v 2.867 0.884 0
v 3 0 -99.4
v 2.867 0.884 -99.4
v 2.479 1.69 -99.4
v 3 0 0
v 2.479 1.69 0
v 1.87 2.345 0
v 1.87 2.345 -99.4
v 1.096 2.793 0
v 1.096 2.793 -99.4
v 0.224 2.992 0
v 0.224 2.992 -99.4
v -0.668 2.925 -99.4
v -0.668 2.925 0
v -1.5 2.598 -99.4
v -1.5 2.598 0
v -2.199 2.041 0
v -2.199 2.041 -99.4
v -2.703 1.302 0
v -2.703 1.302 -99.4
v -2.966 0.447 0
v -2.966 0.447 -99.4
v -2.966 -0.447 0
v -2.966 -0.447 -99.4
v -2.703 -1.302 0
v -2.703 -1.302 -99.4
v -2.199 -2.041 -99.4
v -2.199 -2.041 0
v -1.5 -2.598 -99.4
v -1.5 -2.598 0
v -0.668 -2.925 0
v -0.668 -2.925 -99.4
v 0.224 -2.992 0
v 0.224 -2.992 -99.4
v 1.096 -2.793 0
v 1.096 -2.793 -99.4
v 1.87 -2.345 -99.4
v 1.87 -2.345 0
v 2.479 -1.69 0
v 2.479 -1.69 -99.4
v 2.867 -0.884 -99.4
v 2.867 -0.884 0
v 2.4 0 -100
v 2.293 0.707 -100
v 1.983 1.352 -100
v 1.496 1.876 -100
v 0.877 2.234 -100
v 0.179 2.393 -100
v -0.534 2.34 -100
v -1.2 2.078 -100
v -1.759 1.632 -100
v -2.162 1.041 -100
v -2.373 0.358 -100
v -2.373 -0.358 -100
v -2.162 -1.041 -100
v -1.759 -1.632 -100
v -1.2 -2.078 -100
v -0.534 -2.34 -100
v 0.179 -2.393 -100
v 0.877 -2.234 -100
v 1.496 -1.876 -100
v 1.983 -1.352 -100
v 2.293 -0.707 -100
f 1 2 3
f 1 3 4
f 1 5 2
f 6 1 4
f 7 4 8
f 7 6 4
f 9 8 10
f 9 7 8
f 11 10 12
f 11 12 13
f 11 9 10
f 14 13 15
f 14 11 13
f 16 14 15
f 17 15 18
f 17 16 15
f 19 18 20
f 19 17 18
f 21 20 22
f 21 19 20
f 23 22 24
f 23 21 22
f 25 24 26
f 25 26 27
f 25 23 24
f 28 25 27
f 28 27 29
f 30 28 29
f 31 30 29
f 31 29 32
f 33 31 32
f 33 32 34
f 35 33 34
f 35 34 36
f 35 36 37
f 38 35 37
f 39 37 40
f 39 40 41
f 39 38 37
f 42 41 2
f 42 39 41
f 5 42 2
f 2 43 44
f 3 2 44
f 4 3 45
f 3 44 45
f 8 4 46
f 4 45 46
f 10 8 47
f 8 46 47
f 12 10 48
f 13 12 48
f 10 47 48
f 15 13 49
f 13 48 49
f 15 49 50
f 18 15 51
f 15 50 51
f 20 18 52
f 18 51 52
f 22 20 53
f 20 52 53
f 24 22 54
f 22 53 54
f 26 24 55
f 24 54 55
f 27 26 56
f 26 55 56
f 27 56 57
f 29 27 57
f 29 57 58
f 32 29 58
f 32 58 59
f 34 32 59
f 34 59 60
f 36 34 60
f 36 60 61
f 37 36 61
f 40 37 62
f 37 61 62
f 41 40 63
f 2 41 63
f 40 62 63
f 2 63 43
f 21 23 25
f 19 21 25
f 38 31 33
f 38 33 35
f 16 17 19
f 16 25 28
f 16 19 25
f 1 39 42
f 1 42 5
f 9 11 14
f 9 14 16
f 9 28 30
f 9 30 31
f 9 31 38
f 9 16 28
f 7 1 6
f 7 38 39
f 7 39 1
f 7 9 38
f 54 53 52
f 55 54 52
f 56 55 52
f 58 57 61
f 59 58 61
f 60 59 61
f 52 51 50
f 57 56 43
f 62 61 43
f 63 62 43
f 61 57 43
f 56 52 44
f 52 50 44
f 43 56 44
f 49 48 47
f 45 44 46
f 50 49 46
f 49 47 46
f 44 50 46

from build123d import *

# Parameters (mm, degrees)
SKETCH1_R          = 3
EXTRUDE1_DEPTH     = 100
CHAMFER1_SIZE      = 0.6
SKETCH3_R          = 10.435428451
CUT_EXTRUDE1_DEPTH = 100


with BuildPart() as part:
    # Sketch1 → Extrude1 (new, symmetric)
    with BuildSketch(Plane.XY):
        Circle(SKETCH1_R)
    extrude(amount=EXTRUDE1_DEPTH, both=True)

    # Chamfer1
    chamfer1_edges = [part.edges().sort_by_distance(p)[0] for p in [
        (-3, 0, -100),
        (-3, 0, 100),
    ]]
    chamfer(chamfer1_edges, length=CHAMFER1_SIZE)

    # Sketch3 → Cut-Extrude1 (cut)
    with BuildSketch(Plane.XY.offset(100)):
        Circle(SKETCH3_R)
    extrude(amount=-CUT_EXTRUDE1_DEPTH, mode=Mode.SUBTRACT)


solid = part.part
